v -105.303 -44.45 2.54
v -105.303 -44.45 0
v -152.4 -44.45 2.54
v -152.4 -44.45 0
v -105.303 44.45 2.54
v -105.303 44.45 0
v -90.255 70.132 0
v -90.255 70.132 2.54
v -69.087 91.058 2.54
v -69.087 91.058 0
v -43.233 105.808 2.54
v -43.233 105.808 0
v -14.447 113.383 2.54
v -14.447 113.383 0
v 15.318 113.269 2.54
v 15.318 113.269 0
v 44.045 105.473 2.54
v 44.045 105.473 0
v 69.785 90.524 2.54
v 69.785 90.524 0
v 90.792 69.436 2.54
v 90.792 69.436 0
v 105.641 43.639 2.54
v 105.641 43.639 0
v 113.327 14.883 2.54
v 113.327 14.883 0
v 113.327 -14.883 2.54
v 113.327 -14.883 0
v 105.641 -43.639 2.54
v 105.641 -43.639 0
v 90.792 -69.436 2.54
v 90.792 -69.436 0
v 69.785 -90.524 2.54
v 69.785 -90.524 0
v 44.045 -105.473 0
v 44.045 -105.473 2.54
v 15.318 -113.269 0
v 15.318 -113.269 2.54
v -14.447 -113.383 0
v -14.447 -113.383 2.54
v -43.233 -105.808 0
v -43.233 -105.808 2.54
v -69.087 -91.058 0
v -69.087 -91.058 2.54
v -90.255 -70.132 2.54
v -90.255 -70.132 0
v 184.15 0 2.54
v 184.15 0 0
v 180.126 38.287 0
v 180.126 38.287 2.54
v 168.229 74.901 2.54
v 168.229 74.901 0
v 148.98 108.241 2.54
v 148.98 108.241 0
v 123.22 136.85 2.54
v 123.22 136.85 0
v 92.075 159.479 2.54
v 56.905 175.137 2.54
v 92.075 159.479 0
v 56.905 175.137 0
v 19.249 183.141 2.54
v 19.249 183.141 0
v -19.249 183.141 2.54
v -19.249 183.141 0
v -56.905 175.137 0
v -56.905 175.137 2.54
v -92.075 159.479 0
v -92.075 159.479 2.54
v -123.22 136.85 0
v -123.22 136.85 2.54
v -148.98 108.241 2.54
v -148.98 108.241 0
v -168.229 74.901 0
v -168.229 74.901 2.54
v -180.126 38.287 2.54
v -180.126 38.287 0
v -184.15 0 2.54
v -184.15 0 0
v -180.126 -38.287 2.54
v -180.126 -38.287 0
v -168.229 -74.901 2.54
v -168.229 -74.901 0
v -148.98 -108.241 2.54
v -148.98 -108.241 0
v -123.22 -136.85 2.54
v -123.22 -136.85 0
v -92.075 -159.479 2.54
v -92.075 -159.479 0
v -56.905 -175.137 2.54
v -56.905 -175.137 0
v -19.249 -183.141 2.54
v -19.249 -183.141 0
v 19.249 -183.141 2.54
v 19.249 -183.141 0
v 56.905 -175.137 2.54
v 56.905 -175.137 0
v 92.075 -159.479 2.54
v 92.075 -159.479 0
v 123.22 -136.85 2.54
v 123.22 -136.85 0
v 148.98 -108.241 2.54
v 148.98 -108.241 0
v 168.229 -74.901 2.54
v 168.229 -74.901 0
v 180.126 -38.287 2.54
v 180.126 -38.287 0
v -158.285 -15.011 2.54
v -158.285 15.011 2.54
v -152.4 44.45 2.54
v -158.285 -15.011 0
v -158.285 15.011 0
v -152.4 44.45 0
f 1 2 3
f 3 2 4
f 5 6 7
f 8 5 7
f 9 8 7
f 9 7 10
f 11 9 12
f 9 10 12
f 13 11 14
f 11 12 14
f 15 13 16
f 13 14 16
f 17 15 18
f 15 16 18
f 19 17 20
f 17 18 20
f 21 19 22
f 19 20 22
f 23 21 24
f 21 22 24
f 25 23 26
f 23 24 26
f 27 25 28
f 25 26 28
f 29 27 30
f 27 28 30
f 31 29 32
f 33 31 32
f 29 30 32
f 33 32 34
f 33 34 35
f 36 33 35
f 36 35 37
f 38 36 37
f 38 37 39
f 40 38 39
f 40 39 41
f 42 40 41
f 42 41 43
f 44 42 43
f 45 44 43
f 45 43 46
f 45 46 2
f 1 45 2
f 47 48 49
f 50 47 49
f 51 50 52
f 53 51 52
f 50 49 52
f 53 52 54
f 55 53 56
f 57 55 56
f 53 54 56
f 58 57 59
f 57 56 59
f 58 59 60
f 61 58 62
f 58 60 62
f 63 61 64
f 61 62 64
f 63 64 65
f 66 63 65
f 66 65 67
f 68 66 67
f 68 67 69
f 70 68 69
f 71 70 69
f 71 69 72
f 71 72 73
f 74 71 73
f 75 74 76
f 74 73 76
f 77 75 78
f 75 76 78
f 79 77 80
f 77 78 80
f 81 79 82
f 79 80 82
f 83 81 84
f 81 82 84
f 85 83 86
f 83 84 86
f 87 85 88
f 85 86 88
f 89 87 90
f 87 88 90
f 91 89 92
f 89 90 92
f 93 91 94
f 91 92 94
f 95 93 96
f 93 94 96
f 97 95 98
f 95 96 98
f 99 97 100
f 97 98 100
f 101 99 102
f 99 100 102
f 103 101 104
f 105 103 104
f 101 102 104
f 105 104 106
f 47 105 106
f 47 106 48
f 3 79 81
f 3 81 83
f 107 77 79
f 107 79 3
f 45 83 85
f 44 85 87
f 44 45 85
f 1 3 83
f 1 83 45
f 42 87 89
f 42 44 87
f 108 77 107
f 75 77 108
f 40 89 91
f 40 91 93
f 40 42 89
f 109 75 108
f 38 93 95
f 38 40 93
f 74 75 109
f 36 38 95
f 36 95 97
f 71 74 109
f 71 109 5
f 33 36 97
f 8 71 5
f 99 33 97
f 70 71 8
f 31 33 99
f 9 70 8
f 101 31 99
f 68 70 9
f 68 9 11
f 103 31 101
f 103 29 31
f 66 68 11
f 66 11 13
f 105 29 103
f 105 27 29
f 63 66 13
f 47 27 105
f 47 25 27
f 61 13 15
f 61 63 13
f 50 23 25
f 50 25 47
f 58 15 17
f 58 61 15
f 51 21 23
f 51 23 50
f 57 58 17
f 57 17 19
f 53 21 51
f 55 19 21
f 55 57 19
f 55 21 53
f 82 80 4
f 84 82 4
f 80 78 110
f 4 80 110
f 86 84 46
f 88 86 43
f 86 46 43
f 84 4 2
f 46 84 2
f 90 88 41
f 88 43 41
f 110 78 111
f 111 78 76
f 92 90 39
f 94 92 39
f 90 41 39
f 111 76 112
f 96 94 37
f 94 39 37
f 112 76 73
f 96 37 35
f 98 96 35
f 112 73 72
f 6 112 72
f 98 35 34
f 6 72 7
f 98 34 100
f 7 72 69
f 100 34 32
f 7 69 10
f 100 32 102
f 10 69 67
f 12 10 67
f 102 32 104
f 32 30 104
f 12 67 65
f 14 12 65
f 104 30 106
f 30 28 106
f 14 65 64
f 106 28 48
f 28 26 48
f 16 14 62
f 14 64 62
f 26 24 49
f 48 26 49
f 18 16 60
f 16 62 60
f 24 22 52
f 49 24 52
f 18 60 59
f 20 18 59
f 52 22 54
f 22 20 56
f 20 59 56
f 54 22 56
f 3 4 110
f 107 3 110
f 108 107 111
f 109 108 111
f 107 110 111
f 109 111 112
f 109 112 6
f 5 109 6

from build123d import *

# Parameters (mm, degrees)
SKETCH1_R               = 184.15
BOSS_EXTRUDE1_DEPTH     = 2.54
CUT_EXTRUDE1_DEPTH      = 261.439813777
CUT_EXTRUDE1_DEPTH_BACK = 261.439813777


with BuildPart() as part:
    # Sketch1 → Boss-Extrude1 (new body)
    with BuildSketch(Plane.XY):
        Circle(SKETCH1_R)
    extrude(amount=BOSS_EXTRUDE1_DEPTH)

    # Sketch2 → Cut-Extrude1 (cut, two sides: drawn at the far end of the back side and taken through both)
    with BuildSketch(Plane.XY.offset(2.54).offset(-CUT_EXTRUDE1_DEPTH_BACK)):
        with BuildLine():
            Line((-105.302837094, -44.45), (-152.4, -44.45))
            ThreePointArc((-152.4, -44.45), (-159.026348403, 0), (-152.4, 44.45))
            Line((-152.4, 44.45), (-105.302837094, 44.45))
            ThreePointArc((-105.302837094, 44.45), (114.3, 0), (-105.302837094, -44.45))
        make_face()
    extrude(amount=CUT_EXTRUDE1_DEPTH + CUT_EXTRUDE1_DEPTH_BACK, mode=Mode.SUBTRACT)


solid = part.part
